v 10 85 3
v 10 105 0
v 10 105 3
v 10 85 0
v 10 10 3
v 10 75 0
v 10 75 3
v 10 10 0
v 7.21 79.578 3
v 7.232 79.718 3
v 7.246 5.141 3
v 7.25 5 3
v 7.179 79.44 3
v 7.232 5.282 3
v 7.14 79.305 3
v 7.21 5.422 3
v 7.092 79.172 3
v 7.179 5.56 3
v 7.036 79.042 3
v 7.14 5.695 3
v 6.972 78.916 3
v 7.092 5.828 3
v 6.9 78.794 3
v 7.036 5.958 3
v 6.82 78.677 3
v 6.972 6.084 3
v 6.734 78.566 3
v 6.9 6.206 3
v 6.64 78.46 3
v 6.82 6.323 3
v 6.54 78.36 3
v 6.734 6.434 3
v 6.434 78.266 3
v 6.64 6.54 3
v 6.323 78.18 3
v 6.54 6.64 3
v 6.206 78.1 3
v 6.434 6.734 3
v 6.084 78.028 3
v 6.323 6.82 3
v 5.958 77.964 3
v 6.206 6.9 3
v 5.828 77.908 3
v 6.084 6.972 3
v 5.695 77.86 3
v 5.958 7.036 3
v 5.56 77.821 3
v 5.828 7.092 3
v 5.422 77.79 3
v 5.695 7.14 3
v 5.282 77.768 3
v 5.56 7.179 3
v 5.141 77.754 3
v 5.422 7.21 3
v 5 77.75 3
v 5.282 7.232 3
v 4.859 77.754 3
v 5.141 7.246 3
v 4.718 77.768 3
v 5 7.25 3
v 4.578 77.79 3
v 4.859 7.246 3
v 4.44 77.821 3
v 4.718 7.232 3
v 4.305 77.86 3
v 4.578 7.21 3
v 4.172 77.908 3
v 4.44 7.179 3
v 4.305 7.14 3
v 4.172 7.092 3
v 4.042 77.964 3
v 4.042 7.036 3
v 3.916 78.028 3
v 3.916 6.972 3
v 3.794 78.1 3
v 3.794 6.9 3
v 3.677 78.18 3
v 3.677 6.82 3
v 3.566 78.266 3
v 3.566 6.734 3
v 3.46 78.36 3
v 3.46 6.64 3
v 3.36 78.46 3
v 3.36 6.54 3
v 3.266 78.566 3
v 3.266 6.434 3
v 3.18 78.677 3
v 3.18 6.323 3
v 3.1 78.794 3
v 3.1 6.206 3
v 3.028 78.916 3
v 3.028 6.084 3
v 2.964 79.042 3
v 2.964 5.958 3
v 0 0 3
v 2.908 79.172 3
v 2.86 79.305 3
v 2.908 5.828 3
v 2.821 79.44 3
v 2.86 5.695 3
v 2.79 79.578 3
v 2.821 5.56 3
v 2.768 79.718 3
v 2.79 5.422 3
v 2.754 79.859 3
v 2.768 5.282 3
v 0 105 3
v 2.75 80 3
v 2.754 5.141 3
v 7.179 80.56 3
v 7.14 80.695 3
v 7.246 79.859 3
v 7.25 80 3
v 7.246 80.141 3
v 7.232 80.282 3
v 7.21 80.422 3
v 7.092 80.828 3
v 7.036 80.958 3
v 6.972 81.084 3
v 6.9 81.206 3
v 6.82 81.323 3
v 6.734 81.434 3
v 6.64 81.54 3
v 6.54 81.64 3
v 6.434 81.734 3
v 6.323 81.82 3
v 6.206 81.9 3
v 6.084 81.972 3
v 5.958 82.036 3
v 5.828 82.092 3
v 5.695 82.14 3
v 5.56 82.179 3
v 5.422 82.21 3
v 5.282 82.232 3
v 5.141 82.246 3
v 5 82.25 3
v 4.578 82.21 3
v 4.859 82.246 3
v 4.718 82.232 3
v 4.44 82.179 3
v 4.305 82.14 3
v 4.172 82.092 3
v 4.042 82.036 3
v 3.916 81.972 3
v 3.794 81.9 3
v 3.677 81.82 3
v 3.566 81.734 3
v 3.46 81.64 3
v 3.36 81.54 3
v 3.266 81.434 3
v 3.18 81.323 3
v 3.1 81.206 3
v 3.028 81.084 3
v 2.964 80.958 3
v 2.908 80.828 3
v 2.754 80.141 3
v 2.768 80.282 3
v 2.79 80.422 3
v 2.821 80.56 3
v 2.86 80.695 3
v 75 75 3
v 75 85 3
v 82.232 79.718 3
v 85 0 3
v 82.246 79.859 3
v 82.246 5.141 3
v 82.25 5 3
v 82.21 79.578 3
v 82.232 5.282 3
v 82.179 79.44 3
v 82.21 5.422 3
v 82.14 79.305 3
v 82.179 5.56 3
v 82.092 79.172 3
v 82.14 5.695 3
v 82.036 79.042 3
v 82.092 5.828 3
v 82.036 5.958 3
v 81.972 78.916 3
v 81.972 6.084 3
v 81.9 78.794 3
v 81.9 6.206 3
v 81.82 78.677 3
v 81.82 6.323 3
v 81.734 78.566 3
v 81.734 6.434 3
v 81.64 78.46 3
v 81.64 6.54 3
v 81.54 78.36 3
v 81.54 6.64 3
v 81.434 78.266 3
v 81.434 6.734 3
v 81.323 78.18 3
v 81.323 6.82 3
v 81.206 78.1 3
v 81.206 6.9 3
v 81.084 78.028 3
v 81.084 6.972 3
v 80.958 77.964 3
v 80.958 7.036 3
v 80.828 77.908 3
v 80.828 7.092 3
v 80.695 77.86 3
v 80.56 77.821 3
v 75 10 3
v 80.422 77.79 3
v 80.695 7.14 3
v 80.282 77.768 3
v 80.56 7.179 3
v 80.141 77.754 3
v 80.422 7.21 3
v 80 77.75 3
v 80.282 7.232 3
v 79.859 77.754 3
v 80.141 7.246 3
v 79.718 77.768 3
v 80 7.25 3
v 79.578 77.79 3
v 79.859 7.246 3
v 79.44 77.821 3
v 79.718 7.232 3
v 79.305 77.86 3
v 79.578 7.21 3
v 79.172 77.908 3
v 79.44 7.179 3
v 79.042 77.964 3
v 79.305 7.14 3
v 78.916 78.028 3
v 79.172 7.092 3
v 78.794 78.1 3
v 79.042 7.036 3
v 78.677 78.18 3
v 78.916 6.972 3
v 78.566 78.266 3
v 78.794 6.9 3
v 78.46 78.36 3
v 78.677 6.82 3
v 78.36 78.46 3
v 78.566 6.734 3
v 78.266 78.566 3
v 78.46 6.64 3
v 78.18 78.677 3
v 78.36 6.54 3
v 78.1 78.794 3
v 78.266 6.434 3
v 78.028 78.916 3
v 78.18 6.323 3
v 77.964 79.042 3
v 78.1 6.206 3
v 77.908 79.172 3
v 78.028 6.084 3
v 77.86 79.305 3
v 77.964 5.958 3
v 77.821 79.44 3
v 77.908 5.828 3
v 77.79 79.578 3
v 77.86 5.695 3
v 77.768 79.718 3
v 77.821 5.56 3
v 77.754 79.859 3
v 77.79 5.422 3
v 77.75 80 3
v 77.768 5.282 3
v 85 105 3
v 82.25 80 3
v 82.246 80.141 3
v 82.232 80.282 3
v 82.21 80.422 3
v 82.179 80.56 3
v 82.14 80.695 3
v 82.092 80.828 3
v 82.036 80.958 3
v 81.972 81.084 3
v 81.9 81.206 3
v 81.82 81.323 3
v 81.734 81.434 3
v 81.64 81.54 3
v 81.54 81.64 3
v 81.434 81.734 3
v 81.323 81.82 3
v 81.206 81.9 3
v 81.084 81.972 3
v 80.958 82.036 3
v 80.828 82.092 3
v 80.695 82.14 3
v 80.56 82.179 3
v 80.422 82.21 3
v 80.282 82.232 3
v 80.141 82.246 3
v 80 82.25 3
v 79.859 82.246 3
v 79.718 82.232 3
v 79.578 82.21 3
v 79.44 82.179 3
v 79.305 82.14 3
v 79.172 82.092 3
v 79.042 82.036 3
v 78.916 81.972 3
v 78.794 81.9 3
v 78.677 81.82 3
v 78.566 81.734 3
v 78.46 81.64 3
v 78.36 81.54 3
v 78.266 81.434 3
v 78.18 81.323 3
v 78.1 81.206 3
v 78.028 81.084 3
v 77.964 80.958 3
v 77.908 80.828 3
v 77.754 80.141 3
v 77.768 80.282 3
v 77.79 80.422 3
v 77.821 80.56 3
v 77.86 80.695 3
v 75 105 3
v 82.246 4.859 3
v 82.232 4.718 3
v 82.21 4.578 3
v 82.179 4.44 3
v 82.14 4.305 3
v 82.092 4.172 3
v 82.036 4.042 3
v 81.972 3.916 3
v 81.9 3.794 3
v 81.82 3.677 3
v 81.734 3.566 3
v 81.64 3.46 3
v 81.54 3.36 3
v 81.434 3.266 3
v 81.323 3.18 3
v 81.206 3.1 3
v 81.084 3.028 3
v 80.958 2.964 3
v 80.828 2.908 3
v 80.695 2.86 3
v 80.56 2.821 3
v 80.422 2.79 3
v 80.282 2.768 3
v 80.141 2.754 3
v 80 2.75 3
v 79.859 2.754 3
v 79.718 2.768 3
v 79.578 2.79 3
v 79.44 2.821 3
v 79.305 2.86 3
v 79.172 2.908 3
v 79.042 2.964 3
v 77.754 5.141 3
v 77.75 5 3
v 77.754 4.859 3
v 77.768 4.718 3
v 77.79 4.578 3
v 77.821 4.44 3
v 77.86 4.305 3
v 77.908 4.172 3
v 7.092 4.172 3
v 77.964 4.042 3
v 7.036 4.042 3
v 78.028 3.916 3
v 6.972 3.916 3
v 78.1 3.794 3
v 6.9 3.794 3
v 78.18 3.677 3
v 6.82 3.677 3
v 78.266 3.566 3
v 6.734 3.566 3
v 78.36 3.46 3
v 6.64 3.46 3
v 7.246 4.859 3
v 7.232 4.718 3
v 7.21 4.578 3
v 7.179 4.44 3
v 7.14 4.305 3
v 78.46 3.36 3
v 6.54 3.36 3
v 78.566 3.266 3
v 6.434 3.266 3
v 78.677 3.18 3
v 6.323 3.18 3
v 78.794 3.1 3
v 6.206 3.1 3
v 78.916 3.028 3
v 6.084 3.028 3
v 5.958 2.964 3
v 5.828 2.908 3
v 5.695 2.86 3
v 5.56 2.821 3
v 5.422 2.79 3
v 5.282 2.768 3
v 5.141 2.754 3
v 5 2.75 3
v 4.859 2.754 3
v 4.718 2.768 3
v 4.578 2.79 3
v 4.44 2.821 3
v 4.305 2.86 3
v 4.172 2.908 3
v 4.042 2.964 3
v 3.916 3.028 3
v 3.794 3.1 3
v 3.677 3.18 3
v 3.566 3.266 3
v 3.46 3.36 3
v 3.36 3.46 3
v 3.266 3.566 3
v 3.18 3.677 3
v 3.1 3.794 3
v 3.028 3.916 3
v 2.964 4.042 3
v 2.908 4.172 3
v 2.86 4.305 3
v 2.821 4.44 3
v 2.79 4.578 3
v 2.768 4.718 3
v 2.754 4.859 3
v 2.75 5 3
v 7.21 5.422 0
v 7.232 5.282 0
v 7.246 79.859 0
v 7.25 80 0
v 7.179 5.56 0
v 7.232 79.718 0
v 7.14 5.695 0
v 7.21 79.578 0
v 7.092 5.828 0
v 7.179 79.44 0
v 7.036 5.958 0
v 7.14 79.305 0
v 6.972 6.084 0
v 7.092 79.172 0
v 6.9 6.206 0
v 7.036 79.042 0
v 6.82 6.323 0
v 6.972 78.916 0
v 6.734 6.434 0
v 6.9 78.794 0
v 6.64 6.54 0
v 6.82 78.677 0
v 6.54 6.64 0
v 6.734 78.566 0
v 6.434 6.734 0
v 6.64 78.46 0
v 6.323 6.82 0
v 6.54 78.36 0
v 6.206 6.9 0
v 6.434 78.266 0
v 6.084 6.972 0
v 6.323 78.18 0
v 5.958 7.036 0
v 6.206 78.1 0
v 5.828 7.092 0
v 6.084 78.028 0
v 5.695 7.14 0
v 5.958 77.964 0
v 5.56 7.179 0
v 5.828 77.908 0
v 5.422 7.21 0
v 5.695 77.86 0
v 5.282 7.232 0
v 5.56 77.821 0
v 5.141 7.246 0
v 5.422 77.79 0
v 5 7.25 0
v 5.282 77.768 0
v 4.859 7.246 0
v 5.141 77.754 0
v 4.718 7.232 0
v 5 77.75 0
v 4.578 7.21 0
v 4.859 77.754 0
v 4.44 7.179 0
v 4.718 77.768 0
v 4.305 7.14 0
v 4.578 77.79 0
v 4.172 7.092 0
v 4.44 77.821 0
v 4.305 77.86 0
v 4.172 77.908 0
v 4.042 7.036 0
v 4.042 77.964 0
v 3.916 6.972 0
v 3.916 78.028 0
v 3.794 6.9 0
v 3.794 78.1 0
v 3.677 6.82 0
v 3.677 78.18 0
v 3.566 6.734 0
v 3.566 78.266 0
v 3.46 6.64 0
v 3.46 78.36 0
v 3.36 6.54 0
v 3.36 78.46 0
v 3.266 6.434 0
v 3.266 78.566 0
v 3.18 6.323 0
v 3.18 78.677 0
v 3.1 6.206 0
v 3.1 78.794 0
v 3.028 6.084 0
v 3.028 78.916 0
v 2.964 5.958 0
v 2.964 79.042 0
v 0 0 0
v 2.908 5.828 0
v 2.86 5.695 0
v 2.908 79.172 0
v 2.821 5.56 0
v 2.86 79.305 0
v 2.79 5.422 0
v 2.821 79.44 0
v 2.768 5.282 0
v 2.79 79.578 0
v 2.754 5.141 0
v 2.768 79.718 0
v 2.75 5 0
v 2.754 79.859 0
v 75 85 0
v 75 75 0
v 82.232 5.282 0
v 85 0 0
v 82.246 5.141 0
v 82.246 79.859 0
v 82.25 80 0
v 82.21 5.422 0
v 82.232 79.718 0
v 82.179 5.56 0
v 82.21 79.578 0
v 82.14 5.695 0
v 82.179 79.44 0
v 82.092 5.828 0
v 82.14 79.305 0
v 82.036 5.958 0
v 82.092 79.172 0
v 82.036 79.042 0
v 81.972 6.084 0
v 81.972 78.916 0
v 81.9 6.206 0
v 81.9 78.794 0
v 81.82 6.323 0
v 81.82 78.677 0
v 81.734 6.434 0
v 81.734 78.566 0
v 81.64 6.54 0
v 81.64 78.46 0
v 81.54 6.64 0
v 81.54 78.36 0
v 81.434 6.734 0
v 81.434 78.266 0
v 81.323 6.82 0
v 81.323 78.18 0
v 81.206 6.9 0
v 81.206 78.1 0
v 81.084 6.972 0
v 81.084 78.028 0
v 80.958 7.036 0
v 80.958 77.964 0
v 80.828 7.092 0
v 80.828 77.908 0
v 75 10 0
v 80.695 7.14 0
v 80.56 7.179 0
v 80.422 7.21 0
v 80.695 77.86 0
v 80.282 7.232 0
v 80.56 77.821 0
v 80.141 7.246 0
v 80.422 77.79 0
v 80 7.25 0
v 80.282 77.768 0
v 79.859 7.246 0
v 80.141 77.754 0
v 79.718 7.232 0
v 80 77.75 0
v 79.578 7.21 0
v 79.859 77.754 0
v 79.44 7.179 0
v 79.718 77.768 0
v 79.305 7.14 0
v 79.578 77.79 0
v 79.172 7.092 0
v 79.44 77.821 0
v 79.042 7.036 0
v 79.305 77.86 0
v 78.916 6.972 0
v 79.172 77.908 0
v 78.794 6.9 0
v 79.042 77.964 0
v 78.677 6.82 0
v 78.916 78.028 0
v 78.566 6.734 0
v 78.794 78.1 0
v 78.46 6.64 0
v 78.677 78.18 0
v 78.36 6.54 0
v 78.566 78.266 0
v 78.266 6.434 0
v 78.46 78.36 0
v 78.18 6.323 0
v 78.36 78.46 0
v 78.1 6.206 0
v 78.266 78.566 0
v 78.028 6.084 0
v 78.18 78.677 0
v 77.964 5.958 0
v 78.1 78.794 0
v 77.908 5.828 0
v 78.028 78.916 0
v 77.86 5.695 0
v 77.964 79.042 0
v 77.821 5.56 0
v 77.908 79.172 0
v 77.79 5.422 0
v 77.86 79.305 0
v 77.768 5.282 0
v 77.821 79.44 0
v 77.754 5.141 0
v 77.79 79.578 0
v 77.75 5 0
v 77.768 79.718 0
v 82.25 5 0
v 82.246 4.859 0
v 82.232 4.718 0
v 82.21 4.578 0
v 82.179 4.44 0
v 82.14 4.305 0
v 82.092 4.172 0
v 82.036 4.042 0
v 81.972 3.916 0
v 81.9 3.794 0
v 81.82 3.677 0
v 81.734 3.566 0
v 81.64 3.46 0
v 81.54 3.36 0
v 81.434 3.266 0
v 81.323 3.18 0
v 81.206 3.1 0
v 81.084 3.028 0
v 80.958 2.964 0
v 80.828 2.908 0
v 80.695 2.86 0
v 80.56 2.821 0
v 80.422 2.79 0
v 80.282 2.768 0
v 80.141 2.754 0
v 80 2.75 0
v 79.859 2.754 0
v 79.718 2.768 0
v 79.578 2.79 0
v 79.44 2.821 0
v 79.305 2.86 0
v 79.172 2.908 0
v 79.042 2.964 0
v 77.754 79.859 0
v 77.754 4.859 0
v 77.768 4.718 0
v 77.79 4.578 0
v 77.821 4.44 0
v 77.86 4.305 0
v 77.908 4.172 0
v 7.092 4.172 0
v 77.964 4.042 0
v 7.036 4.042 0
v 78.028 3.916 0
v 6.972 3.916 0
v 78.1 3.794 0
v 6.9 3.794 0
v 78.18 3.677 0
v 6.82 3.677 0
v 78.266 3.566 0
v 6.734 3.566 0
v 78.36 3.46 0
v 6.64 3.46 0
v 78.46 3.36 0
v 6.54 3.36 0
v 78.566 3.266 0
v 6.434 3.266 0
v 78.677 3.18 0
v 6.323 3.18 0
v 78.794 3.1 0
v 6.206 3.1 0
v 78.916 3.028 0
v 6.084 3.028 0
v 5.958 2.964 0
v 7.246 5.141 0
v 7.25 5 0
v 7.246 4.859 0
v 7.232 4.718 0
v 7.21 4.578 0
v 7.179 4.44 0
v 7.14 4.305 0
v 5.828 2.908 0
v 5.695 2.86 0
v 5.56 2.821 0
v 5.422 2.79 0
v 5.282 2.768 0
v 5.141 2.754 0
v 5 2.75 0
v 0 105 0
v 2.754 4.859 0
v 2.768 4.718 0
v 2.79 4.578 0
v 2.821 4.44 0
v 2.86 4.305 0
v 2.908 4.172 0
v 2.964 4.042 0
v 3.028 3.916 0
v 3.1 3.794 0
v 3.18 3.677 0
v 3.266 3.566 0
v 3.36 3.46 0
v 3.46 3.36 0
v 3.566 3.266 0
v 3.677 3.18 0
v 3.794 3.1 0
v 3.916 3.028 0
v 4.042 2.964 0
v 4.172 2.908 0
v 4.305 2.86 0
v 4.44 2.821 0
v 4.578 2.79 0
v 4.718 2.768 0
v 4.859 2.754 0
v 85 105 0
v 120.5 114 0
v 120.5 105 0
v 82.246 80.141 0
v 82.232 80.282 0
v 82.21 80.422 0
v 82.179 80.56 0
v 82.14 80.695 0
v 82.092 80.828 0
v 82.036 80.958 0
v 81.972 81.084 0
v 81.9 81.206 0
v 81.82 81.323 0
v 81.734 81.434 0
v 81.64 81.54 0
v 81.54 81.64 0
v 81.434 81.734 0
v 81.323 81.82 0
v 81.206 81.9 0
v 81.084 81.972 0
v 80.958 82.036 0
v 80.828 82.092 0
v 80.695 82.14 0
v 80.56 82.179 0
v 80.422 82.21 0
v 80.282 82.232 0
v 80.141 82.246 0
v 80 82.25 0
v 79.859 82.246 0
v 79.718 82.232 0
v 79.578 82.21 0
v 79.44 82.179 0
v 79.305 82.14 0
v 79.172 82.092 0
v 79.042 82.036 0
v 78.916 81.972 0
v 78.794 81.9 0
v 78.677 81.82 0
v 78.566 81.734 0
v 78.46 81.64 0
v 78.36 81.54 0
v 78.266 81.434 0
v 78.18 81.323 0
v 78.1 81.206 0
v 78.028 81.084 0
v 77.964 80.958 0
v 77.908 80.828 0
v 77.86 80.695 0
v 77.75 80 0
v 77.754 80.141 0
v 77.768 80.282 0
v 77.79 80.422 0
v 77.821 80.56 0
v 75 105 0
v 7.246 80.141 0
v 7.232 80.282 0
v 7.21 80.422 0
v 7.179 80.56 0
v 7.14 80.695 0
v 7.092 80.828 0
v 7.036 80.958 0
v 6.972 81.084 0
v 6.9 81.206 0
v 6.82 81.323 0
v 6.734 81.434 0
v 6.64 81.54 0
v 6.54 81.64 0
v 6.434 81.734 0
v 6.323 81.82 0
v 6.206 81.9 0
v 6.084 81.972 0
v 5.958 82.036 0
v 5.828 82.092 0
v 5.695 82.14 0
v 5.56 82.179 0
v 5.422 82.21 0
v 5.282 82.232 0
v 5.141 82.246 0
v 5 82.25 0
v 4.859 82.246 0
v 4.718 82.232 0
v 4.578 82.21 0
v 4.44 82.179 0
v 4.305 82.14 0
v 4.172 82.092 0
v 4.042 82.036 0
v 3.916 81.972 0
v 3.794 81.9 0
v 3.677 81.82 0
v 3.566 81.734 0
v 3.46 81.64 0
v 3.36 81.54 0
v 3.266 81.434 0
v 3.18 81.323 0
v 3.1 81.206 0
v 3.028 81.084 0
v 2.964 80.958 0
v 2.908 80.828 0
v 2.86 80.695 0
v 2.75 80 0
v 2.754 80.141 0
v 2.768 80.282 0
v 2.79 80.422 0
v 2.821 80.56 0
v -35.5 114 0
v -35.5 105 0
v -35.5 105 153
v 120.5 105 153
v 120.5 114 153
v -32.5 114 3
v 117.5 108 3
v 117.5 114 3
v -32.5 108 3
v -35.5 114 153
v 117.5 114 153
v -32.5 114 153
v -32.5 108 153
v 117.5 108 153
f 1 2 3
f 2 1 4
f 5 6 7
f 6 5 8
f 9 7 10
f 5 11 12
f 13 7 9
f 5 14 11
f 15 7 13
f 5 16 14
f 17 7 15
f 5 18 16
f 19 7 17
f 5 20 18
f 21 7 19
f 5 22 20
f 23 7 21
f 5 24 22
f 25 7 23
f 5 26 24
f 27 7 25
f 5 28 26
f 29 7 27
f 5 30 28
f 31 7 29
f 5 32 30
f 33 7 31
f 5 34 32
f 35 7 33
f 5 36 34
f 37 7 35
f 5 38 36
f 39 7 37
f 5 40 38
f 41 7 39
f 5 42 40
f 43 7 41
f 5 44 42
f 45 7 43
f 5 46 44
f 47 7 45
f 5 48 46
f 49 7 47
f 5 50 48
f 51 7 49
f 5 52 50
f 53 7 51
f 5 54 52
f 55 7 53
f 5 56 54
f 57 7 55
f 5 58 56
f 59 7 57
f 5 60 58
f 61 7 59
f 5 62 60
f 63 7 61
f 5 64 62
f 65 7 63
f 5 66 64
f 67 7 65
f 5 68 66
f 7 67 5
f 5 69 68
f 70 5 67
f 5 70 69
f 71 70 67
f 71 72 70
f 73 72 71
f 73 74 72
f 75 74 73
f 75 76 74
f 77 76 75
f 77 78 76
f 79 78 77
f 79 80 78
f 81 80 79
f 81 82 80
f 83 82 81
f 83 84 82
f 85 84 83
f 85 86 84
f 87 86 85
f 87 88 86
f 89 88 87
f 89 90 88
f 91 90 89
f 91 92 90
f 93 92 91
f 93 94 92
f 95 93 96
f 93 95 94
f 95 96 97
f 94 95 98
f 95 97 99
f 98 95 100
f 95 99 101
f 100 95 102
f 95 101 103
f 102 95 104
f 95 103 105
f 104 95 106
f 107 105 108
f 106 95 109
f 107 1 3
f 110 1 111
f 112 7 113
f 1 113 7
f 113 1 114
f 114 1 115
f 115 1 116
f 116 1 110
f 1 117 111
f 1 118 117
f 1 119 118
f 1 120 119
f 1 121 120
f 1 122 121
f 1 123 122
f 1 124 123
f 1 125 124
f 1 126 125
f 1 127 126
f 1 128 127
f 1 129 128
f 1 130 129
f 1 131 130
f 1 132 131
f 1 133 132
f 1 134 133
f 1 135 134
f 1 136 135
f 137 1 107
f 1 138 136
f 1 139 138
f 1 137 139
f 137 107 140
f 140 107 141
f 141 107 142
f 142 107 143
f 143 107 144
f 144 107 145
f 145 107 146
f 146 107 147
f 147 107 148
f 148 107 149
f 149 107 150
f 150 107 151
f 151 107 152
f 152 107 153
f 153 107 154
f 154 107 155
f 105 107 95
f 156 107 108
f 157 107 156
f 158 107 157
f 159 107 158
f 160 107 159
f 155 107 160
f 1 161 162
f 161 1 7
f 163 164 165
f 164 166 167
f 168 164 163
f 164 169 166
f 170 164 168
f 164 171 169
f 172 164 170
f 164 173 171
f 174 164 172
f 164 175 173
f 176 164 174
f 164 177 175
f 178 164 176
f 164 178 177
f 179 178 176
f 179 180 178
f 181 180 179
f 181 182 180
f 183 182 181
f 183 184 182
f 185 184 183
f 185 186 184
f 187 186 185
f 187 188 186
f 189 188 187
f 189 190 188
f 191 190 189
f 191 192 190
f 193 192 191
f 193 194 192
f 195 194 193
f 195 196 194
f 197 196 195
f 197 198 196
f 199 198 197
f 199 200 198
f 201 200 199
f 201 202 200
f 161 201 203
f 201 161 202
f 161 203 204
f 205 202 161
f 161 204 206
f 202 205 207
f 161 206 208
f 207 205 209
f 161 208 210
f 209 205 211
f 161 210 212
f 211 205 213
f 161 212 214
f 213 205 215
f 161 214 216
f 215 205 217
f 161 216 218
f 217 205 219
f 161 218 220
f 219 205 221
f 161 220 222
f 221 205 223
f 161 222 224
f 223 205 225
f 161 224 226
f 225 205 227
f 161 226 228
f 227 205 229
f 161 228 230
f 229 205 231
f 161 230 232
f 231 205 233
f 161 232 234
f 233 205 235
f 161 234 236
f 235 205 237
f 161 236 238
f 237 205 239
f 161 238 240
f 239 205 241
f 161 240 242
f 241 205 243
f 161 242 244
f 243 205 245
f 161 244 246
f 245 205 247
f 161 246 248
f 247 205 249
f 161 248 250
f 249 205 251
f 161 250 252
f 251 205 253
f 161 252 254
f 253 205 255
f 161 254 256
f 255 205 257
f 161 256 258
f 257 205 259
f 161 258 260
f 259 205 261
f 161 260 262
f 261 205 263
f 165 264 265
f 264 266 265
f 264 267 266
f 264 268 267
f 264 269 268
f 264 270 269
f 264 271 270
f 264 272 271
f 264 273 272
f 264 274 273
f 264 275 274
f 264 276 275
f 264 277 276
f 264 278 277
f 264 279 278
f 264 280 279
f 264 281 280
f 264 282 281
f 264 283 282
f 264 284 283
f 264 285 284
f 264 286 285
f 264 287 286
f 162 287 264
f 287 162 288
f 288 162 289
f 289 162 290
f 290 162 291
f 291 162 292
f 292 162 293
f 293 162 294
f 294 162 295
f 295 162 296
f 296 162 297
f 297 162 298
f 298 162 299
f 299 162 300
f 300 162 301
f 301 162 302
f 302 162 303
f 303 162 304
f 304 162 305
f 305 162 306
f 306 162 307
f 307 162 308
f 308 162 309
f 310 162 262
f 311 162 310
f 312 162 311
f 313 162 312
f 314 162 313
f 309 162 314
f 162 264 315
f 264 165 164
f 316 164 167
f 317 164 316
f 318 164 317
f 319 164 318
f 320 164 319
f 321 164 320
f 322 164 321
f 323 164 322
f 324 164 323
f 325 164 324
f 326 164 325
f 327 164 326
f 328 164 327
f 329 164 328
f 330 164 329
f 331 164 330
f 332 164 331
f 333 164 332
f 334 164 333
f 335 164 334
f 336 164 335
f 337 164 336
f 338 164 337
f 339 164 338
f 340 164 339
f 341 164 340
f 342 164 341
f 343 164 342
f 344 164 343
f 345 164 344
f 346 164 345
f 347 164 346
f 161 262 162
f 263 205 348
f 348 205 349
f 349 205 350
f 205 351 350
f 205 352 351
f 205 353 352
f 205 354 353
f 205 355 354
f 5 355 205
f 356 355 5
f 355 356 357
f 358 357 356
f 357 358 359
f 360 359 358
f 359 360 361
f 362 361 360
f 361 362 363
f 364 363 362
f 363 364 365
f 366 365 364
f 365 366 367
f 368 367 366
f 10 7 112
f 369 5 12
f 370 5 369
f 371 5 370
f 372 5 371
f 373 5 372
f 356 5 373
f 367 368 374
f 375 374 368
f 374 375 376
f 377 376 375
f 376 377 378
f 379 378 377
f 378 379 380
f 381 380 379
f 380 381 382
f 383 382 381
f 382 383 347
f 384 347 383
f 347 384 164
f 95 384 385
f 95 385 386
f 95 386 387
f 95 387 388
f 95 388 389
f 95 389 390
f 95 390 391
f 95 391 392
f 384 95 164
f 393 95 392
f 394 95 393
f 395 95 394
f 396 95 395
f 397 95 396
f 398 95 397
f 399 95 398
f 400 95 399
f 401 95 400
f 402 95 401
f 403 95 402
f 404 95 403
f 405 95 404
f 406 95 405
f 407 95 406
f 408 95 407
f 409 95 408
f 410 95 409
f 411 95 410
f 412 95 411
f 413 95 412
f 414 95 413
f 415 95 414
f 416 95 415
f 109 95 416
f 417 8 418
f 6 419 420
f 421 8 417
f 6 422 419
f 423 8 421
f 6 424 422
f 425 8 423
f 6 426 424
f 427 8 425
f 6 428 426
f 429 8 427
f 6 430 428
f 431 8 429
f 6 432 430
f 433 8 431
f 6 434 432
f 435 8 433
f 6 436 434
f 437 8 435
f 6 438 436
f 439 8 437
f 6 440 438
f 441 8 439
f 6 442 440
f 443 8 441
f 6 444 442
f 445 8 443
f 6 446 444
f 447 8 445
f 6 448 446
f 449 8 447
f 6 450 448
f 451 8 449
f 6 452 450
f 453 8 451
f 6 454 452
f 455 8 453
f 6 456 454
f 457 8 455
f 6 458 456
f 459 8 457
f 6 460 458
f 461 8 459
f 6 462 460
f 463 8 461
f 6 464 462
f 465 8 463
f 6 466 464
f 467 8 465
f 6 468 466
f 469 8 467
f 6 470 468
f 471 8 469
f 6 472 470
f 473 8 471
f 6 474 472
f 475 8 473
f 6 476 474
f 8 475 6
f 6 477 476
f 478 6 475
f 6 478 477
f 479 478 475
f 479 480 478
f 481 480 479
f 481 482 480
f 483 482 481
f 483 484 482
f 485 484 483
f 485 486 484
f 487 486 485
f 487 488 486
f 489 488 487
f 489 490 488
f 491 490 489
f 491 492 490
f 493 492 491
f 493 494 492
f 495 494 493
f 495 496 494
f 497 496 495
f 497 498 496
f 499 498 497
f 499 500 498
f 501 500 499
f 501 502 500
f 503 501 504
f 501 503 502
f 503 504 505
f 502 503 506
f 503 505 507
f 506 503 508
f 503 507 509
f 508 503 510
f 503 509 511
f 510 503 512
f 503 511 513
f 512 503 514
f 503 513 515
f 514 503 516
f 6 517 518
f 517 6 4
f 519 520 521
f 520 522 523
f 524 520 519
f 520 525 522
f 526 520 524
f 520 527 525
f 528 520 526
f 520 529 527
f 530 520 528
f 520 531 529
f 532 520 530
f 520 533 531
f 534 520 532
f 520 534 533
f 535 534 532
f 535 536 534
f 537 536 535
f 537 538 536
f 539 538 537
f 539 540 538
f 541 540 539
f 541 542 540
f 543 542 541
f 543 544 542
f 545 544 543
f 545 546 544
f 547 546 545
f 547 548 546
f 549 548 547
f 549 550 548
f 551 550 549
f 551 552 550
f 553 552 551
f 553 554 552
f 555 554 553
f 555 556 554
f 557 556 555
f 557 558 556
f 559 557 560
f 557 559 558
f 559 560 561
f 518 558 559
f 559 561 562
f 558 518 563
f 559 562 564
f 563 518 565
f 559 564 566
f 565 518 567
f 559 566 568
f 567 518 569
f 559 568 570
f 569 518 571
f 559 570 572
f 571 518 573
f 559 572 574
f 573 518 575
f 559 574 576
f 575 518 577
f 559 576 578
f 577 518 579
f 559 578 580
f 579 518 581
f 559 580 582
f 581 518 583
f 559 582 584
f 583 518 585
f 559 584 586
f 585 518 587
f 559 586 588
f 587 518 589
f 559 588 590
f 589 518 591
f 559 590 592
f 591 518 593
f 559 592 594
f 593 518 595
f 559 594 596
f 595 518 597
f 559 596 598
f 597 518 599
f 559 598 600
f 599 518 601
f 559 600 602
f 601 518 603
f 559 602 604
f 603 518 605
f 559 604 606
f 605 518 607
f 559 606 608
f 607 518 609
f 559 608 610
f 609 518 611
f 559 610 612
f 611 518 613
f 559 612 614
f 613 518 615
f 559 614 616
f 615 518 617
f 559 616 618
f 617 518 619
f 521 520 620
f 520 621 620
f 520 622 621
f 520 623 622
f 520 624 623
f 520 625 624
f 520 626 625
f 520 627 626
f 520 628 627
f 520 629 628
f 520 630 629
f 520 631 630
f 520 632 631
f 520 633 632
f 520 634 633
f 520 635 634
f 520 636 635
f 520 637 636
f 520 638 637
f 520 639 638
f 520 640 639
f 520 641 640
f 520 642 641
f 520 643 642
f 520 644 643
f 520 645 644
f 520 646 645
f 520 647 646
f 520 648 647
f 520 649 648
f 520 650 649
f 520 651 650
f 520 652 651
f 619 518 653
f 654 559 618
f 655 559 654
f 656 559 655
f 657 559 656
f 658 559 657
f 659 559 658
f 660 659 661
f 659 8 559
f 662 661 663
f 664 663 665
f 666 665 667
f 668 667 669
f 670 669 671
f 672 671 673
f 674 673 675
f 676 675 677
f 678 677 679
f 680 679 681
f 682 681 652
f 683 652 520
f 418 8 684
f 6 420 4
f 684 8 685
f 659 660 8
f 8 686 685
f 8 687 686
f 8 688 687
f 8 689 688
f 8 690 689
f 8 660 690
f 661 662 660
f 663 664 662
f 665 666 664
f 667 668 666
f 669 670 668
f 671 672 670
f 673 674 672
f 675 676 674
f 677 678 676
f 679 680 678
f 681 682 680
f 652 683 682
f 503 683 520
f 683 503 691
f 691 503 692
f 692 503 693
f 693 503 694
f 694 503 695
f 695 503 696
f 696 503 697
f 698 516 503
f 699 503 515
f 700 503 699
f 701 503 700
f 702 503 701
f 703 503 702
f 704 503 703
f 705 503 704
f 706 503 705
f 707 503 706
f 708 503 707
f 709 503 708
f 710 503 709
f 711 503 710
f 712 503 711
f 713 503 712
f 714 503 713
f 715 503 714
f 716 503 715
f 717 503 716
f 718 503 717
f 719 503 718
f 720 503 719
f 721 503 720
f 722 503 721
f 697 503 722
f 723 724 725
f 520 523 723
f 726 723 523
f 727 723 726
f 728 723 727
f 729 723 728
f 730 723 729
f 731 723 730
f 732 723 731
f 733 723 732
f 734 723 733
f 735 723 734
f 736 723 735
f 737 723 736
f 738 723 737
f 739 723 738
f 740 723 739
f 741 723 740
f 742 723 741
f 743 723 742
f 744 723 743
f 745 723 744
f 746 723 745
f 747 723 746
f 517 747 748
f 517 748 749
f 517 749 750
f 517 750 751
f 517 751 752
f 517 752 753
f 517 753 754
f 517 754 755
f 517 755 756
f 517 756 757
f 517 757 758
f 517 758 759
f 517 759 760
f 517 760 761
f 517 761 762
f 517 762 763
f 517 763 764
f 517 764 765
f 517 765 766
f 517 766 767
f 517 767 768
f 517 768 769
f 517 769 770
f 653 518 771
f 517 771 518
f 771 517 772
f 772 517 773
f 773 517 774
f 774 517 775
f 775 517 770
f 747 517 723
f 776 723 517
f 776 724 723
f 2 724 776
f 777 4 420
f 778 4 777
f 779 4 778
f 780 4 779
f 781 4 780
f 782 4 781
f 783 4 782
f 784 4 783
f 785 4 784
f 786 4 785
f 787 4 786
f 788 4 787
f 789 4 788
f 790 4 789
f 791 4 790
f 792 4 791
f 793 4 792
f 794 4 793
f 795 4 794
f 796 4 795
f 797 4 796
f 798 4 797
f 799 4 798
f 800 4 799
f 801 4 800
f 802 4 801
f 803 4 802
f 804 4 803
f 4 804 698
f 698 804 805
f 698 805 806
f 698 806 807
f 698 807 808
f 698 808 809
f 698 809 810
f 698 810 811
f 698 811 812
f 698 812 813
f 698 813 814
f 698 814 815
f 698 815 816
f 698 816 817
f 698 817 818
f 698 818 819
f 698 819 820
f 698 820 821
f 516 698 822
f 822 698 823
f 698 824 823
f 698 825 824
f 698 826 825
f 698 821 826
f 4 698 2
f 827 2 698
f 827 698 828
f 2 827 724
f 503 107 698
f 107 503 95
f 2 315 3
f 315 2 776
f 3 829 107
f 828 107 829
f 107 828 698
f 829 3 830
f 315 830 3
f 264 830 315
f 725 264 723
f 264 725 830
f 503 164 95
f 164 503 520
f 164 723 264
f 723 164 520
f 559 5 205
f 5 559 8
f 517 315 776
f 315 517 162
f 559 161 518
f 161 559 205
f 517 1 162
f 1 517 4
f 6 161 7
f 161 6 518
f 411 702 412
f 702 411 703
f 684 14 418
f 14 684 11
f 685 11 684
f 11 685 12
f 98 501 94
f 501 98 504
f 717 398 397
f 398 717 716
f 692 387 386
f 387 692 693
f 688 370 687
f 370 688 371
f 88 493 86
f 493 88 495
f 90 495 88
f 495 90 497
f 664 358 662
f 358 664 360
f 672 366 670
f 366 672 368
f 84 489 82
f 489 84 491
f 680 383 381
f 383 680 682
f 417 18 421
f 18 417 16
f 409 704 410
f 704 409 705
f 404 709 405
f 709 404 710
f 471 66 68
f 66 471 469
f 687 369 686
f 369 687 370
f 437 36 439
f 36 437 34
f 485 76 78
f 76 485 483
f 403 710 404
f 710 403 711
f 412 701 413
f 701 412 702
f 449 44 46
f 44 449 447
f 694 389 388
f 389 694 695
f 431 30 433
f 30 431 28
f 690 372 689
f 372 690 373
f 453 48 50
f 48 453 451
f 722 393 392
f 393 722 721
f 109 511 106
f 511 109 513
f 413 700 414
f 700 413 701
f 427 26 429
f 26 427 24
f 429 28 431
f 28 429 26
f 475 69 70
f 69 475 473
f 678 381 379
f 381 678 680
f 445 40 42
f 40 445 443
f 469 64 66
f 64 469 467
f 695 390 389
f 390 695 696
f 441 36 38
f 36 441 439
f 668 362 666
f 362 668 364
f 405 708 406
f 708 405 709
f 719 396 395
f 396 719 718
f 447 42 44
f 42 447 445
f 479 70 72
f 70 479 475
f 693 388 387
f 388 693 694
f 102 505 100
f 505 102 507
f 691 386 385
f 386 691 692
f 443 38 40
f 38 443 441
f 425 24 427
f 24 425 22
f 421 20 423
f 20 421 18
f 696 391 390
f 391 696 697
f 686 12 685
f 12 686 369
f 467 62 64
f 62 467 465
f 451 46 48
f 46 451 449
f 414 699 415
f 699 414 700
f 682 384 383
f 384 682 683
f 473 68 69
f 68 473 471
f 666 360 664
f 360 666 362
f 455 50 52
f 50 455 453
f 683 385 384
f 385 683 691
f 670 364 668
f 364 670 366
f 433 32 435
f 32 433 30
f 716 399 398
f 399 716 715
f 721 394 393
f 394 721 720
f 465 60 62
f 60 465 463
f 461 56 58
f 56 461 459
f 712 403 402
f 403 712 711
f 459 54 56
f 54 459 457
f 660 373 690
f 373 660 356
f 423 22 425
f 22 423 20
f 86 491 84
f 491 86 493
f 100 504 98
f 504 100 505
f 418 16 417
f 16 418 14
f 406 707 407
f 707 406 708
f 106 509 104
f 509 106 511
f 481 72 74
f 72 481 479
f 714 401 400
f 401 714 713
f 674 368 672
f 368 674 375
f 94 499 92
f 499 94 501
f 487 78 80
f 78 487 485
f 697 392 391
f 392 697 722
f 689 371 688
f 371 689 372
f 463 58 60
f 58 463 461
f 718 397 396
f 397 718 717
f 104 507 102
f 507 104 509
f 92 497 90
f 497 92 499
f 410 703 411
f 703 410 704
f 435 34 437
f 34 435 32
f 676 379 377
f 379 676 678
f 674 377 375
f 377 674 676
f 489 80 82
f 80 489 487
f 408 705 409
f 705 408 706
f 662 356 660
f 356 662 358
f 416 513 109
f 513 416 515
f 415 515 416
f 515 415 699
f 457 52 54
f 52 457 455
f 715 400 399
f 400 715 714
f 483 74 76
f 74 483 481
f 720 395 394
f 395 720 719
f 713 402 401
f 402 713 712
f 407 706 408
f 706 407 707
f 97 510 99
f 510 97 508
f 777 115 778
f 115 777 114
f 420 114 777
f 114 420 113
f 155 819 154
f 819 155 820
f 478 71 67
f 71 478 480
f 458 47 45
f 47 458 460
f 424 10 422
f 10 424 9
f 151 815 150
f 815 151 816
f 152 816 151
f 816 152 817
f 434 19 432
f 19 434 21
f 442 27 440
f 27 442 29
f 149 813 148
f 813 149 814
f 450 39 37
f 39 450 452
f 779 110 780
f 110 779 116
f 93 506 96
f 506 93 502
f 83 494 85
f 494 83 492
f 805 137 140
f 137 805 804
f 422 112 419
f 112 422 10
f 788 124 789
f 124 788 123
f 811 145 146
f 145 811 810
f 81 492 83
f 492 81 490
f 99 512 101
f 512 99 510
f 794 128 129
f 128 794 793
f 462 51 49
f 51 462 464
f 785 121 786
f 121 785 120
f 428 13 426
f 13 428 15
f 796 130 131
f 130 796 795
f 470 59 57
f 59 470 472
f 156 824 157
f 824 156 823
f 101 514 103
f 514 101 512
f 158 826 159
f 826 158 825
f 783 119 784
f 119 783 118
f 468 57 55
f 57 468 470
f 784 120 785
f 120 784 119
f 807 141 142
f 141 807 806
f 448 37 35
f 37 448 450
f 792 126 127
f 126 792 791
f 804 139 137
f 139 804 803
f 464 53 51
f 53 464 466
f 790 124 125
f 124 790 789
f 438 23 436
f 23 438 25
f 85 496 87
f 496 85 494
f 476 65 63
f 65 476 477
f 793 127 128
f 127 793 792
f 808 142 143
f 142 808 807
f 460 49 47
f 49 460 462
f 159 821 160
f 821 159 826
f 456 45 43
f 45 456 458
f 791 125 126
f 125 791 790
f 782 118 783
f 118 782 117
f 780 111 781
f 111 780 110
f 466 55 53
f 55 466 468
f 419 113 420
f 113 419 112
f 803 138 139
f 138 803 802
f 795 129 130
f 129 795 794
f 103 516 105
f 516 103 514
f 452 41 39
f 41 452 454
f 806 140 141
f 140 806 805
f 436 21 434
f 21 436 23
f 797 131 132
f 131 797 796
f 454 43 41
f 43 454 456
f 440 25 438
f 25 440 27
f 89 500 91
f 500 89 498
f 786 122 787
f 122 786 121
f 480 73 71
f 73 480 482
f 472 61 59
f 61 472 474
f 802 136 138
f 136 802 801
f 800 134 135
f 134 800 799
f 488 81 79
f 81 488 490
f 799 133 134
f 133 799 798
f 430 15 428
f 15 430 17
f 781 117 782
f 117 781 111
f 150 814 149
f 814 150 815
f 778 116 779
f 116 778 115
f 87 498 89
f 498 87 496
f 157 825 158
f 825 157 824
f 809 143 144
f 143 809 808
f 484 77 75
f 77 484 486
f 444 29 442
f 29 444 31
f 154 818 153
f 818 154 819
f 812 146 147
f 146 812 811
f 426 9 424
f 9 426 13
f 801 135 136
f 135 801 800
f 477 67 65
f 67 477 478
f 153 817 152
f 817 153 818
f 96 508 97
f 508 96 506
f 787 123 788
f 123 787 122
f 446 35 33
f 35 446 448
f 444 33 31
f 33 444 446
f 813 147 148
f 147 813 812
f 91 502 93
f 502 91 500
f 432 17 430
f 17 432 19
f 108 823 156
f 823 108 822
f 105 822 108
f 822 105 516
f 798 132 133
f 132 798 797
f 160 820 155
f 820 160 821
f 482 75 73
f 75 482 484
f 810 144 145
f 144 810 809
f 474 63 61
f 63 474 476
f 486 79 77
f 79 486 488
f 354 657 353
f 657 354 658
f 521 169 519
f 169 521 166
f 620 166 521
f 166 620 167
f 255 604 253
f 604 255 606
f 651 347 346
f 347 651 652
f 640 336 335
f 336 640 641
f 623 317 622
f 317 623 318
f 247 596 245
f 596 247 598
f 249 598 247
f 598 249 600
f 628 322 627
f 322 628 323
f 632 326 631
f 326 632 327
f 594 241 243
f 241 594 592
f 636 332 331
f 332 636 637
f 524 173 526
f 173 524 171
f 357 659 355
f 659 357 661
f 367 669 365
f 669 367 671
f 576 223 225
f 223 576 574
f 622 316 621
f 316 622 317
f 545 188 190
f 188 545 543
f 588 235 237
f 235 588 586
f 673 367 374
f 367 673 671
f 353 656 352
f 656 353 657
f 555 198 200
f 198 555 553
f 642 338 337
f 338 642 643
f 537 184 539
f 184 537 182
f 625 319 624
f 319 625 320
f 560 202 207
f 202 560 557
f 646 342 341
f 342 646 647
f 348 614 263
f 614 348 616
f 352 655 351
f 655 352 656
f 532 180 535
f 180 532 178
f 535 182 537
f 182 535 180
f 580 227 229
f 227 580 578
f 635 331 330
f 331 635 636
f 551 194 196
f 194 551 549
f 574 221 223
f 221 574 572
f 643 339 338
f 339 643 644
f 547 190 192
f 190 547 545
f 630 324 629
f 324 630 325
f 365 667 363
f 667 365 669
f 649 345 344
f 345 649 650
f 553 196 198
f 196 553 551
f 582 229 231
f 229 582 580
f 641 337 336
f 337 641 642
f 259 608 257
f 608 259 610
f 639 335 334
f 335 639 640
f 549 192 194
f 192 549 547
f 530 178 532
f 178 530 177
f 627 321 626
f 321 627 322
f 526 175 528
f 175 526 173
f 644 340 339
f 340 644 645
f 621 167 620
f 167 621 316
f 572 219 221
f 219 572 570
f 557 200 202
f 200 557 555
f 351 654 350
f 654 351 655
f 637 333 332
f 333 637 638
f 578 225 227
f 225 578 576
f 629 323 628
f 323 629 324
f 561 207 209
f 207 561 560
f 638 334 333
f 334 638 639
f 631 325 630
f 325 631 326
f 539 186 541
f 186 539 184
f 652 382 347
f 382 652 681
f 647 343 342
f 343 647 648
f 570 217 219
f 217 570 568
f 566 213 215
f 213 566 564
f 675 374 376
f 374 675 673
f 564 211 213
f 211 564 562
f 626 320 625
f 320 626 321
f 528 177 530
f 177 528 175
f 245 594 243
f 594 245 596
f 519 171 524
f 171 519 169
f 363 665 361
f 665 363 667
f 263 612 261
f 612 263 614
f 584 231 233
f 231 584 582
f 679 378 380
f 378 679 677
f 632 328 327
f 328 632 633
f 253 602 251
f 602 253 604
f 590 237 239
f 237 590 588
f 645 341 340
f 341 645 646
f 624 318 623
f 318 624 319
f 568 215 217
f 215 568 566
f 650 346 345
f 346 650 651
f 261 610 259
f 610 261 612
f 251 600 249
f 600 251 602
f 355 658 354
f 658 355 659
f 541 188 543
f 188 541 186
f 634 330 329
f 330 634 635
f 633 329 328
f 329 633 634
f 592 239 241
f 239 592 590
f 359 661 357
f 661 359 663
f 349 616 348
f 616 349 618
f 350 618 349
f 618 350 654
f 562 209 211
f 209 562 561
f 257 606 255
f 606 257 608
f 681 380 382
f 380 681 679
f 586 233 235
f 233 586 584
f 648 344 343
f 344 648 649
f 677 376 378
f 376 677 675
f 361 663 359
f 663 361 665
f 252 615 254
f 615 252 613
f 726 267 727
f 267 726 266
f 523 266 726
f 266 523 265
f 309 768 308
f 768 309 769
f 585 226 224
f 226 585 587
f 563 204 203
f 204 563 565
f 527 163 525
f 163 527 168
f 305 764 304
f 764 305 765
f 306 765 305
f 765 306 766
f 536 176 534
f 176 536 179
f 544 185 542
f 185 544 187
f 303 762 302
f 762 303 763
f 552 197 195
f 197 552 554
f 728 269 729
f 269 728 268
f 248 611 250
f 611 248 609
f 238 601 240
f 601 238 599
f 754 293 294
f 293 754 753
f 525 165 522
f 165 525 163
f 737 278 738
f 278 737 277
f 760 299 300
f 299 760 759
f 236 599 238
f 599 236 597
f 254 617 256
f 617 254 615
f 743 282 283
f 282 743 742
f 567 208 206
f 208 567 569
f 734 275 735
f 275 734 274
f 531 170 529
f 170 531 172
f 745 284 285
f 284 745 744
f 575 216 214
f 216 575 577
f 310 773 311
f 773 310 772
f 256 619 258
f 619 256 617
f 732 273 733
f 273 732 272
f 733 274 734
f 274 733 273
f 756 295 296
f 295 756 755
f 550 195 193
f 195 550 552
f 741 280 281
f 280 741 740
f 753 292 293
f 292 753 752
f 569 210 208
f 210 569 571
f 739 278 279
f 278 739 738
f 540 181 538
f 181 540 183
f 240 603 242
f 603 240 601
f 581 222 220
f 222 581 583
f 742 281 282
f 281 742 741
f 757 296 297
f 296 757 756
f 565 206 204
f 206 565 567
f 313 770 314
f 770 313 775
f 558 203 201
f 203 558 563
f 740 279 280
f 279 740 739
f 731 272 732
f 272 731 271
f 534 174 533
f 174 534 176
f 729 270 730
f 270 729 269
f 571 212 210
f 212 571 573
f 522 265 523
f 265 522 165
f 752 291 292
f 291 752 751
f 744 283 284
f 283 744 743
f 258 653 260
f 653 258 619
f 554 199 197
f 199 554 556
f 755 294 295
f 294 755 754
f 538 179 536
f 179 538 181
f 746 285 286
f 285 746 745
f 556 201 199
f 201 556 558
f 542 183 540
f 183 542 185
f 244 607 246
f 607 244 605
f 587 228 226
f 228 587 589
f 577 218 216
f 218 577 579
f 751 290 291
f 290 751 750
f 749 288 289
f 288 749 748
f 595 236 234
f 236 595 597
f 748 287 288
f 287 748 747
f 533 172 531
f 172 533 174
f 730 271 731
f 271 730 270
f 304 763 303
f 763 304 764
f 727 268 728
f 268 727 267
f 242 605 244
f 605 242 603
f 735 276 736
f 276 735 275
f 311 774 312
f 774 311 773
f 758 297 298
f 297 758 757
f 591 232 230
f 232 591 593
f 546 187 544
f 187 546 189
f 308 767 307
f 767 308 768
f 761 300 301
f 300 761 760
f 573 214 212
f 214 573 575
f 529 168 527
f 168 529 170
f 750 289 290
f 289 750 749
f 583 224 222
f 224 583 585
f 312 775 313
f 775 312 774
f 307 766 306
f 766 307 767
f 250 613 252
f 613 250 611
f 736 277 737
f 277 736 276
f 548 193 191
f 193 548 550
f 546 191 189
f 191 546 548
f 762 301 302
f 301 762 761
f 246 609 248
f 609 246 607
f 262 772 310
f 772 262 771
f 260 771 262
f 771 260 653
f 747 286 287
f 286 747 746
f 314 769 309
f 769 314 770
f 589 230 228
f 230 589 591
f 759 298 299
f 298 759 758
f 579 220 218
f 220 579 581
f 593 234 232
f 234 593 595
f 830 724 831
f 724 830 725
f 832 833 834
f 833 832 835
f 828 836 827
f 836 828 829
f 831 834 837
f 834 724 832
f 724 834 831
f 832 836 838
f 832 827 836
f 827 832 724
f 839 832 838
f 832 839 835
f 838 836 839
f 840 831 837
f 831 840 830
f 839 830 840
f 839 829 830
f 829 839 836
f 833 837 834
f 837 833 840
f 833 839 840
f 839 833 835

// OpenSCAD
// Sizes of shelf. All are mm
/* [VESA Spacing] */
spacing = 75;

/* [Tickness] */
thickness = 3;

/* [Width] */
support_width = 10;

/* [Screw size (4 for M4, 5 for M5...). 75 and 100mm VESA uses M4] */
screw_size = 4;

/* [Shelf width] */
shelf_width = 150;

/* [Shelf height] */
shelf_height = 150;

/* [Space between shelf and mount] */
shelf_space = 20;

/* [Shelf rim] */
rim = 6;

/* [Hidden] */

module vesa_mount()
{
  difference()
  {
    union()
    {
      cube([support_width, spacing + support_width + shelf_space, thickness]);
      cube([spacing + support_width, support_width, thickness]);

      translate([spacing, 0, 0])
      {
        cube([support_width, spacing + support_width + shelf_space, thickness]);
      }
      translate([0, spacing, 0])
      {
        cube([spacing + support_width, support_width, thickness]);
      }
    }

    for(decal_x=[0:1:1])
    {
      for(decal_y=[0:1:1])
      {
        translate([spacing * decal_x + support_width / 2, spacing * decal_y + support_width / 2, 0])
        {
          cylinder(h=2 * thickness + 2, d=screw_size + 0.5, center=true, $fn=100);
        }
      }
    }
  }
}

module shelf()
{
  union()
  {
    cube([shelf_width + thickness * 2, thickness + rim, thickness]);
    cube([thickness, thickness + rim, shelf_height + thickness]);
    translate([shelf_width + thickness, 0, 0])
    {
      cube([thickness, thickness + rim, shelf_height + thickness]);
    }

    cube([shelf_width + thickness * 2, thickness, shelf_height + thickness]);
  }
}

vesa_mount();
translate([shelf_width / -2 - thickness + (spacing + support_width) / 2 , spacing + support_width + shelf_space, 0])
{
  shelf();
}
